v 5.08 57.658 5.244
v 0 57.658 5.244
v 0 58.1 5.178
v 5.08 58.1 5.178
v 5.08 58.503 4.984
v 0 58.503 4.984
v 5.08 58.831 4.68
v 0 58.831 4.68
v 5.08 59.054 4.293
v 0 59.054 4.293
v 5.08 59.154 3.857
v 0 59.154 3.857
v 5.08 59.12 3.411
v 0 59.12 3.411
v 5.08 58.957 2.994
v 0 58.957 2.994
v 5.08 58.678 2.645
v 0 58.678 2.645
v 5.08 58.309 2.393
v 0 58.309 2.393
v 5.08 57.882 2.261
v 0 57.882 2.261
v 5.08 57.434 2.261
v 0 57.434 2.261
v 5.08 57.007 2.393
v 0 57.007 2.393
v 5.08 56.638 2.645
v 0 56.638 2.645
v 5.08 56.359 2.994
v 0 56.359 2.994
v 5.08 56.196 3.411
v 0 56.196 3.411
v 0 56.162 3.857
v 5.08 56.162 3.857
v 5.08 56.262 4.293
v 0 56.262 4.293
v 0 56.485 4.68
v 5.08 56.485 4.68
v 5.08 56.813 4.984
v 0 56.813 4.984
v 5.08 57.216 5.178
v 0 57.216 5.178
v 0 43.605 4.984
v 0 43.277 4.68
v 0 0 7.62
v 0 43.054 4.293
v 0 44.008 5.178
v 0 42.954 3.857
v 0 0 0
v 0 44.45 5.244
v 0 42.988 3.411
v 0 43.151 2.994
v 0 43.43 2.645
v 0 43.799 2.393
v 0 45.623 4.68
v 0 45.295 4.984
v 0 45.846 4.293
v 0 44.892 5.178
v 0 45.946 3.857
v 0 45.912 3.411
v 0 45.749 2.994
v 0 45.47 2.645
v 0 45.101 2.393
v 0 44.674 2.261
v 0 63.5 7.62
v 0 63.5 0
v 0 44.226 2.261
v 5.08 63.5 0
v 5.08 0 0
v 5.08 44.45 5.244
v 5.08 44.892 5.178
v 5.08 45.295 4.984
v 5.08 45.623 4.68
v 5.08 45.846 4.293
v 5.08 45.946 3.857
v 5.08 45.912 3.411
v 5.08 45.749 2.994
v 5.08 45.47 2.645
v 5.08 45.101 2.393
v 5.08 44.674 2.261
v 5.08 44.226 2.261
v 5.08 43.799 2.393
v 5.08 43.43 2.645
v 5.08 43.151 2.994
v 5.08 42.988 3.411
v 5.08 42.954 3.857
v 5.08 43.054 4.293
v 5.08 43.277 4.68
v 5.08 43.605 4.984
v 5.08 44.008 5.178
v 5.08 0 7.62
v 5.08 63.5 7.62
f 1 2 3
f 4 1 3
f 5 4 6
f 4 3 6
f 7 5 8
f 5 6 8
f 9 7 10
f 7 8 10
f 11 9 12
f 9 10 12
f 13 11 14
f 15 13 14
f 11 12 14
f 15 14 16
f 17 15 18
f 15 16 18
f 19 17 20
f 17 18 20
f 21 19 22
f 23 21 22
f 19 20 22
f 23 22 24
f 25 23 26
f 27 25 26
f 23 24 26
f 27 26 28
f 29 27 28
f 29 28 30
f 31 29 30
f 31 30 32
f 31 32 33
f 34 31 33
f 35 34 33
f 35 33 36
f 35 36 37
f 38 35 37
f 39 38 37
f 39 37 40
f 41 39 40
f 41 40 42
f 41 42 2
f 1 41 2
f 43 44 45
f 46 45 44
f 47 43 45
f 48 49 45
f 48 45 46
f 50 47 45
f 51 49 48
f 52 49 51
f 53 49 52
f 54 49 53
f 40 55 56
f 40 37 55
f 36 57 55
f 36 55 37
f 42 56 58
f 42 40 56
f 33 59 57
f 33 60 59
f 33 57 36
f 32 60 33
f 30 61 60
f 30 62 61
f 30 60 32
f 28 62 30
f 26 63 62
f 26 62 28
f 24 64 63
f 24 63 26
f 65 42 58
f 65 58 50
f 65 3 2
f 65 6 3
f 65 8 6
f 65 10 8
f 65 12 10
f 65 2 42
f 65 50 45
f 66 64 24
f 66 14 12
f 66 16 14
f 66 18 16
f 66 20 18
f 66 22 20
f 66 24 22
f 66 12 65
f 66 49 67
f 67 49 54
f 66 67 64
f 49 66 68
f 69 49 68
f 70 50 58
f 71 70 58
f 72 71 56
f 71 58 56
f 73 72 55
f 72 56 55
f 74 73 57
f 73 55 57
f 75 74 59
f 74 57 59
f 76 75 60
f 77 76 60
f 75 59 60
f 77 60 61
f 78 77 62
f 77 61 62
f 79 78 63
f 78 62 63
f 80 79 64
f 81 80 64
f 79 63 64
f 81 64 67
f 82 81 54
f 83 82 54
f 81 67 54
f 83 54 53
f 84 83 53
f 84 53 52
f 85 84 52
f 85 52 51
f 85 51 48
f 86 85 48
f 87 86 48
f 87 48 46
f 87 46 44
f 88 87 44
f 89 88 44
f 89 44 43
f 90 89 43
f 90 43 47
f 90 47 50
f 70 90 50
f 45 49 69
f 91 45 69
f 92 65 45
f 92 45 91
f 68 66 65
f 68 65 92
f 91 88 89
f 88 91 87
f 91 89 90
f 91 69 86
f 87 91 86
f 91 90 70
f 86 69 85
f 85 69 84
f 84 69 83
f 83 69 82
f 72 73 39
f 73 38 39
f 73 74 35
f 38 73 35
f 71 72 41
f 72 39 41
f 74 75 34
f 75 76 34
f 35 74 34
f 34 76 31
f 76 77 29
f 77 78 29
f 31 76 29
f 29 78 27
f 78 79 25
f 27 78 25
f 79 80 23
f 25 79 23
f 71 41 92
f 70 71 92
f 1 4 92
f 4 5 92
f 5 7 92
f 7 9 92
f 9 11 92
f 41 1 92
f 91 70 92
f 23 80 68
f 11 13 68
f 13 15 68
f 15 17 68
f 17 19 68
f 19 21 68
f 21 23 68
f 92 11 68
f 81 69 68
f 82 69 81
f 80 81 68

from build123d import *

# Parameters (mm, degrees)
SKETCH1_W           = 5.08
SKETCH1_H           = 63.5
BOSS_EXTRUDE1_DEPTH = 7.62
SKETCH2_R           = 1.5
CUT_EXTRUDE1_DEPTH  = 6.08


with BuildPart() as part:
    # Sketch1 → Boss-Extrude1 (new body)
    with BuildSketch(Plane.XY):
        with Locations((2.54, 31.75)):
            Rectangle(SKETCH1_W, SKETCH1_H)
    extrude(amount=BOSS_EXTRUDE1_DEPTH)

    # Sketch2 → Cut-Extrude1 (cut, through all)
    with BuildSketch(Plane.ZY):
        with Locations((3.744499847, 57.658)):
            Circle(SKETCH2_R)
        with Locations((3.744499847, 44.45)):
            Circle(SKETCH2_R)
    extrude(amount=-CUT_EXTRUDE1_DEPTH, mode=Mode.SUBTRACT)


solid = part.part
